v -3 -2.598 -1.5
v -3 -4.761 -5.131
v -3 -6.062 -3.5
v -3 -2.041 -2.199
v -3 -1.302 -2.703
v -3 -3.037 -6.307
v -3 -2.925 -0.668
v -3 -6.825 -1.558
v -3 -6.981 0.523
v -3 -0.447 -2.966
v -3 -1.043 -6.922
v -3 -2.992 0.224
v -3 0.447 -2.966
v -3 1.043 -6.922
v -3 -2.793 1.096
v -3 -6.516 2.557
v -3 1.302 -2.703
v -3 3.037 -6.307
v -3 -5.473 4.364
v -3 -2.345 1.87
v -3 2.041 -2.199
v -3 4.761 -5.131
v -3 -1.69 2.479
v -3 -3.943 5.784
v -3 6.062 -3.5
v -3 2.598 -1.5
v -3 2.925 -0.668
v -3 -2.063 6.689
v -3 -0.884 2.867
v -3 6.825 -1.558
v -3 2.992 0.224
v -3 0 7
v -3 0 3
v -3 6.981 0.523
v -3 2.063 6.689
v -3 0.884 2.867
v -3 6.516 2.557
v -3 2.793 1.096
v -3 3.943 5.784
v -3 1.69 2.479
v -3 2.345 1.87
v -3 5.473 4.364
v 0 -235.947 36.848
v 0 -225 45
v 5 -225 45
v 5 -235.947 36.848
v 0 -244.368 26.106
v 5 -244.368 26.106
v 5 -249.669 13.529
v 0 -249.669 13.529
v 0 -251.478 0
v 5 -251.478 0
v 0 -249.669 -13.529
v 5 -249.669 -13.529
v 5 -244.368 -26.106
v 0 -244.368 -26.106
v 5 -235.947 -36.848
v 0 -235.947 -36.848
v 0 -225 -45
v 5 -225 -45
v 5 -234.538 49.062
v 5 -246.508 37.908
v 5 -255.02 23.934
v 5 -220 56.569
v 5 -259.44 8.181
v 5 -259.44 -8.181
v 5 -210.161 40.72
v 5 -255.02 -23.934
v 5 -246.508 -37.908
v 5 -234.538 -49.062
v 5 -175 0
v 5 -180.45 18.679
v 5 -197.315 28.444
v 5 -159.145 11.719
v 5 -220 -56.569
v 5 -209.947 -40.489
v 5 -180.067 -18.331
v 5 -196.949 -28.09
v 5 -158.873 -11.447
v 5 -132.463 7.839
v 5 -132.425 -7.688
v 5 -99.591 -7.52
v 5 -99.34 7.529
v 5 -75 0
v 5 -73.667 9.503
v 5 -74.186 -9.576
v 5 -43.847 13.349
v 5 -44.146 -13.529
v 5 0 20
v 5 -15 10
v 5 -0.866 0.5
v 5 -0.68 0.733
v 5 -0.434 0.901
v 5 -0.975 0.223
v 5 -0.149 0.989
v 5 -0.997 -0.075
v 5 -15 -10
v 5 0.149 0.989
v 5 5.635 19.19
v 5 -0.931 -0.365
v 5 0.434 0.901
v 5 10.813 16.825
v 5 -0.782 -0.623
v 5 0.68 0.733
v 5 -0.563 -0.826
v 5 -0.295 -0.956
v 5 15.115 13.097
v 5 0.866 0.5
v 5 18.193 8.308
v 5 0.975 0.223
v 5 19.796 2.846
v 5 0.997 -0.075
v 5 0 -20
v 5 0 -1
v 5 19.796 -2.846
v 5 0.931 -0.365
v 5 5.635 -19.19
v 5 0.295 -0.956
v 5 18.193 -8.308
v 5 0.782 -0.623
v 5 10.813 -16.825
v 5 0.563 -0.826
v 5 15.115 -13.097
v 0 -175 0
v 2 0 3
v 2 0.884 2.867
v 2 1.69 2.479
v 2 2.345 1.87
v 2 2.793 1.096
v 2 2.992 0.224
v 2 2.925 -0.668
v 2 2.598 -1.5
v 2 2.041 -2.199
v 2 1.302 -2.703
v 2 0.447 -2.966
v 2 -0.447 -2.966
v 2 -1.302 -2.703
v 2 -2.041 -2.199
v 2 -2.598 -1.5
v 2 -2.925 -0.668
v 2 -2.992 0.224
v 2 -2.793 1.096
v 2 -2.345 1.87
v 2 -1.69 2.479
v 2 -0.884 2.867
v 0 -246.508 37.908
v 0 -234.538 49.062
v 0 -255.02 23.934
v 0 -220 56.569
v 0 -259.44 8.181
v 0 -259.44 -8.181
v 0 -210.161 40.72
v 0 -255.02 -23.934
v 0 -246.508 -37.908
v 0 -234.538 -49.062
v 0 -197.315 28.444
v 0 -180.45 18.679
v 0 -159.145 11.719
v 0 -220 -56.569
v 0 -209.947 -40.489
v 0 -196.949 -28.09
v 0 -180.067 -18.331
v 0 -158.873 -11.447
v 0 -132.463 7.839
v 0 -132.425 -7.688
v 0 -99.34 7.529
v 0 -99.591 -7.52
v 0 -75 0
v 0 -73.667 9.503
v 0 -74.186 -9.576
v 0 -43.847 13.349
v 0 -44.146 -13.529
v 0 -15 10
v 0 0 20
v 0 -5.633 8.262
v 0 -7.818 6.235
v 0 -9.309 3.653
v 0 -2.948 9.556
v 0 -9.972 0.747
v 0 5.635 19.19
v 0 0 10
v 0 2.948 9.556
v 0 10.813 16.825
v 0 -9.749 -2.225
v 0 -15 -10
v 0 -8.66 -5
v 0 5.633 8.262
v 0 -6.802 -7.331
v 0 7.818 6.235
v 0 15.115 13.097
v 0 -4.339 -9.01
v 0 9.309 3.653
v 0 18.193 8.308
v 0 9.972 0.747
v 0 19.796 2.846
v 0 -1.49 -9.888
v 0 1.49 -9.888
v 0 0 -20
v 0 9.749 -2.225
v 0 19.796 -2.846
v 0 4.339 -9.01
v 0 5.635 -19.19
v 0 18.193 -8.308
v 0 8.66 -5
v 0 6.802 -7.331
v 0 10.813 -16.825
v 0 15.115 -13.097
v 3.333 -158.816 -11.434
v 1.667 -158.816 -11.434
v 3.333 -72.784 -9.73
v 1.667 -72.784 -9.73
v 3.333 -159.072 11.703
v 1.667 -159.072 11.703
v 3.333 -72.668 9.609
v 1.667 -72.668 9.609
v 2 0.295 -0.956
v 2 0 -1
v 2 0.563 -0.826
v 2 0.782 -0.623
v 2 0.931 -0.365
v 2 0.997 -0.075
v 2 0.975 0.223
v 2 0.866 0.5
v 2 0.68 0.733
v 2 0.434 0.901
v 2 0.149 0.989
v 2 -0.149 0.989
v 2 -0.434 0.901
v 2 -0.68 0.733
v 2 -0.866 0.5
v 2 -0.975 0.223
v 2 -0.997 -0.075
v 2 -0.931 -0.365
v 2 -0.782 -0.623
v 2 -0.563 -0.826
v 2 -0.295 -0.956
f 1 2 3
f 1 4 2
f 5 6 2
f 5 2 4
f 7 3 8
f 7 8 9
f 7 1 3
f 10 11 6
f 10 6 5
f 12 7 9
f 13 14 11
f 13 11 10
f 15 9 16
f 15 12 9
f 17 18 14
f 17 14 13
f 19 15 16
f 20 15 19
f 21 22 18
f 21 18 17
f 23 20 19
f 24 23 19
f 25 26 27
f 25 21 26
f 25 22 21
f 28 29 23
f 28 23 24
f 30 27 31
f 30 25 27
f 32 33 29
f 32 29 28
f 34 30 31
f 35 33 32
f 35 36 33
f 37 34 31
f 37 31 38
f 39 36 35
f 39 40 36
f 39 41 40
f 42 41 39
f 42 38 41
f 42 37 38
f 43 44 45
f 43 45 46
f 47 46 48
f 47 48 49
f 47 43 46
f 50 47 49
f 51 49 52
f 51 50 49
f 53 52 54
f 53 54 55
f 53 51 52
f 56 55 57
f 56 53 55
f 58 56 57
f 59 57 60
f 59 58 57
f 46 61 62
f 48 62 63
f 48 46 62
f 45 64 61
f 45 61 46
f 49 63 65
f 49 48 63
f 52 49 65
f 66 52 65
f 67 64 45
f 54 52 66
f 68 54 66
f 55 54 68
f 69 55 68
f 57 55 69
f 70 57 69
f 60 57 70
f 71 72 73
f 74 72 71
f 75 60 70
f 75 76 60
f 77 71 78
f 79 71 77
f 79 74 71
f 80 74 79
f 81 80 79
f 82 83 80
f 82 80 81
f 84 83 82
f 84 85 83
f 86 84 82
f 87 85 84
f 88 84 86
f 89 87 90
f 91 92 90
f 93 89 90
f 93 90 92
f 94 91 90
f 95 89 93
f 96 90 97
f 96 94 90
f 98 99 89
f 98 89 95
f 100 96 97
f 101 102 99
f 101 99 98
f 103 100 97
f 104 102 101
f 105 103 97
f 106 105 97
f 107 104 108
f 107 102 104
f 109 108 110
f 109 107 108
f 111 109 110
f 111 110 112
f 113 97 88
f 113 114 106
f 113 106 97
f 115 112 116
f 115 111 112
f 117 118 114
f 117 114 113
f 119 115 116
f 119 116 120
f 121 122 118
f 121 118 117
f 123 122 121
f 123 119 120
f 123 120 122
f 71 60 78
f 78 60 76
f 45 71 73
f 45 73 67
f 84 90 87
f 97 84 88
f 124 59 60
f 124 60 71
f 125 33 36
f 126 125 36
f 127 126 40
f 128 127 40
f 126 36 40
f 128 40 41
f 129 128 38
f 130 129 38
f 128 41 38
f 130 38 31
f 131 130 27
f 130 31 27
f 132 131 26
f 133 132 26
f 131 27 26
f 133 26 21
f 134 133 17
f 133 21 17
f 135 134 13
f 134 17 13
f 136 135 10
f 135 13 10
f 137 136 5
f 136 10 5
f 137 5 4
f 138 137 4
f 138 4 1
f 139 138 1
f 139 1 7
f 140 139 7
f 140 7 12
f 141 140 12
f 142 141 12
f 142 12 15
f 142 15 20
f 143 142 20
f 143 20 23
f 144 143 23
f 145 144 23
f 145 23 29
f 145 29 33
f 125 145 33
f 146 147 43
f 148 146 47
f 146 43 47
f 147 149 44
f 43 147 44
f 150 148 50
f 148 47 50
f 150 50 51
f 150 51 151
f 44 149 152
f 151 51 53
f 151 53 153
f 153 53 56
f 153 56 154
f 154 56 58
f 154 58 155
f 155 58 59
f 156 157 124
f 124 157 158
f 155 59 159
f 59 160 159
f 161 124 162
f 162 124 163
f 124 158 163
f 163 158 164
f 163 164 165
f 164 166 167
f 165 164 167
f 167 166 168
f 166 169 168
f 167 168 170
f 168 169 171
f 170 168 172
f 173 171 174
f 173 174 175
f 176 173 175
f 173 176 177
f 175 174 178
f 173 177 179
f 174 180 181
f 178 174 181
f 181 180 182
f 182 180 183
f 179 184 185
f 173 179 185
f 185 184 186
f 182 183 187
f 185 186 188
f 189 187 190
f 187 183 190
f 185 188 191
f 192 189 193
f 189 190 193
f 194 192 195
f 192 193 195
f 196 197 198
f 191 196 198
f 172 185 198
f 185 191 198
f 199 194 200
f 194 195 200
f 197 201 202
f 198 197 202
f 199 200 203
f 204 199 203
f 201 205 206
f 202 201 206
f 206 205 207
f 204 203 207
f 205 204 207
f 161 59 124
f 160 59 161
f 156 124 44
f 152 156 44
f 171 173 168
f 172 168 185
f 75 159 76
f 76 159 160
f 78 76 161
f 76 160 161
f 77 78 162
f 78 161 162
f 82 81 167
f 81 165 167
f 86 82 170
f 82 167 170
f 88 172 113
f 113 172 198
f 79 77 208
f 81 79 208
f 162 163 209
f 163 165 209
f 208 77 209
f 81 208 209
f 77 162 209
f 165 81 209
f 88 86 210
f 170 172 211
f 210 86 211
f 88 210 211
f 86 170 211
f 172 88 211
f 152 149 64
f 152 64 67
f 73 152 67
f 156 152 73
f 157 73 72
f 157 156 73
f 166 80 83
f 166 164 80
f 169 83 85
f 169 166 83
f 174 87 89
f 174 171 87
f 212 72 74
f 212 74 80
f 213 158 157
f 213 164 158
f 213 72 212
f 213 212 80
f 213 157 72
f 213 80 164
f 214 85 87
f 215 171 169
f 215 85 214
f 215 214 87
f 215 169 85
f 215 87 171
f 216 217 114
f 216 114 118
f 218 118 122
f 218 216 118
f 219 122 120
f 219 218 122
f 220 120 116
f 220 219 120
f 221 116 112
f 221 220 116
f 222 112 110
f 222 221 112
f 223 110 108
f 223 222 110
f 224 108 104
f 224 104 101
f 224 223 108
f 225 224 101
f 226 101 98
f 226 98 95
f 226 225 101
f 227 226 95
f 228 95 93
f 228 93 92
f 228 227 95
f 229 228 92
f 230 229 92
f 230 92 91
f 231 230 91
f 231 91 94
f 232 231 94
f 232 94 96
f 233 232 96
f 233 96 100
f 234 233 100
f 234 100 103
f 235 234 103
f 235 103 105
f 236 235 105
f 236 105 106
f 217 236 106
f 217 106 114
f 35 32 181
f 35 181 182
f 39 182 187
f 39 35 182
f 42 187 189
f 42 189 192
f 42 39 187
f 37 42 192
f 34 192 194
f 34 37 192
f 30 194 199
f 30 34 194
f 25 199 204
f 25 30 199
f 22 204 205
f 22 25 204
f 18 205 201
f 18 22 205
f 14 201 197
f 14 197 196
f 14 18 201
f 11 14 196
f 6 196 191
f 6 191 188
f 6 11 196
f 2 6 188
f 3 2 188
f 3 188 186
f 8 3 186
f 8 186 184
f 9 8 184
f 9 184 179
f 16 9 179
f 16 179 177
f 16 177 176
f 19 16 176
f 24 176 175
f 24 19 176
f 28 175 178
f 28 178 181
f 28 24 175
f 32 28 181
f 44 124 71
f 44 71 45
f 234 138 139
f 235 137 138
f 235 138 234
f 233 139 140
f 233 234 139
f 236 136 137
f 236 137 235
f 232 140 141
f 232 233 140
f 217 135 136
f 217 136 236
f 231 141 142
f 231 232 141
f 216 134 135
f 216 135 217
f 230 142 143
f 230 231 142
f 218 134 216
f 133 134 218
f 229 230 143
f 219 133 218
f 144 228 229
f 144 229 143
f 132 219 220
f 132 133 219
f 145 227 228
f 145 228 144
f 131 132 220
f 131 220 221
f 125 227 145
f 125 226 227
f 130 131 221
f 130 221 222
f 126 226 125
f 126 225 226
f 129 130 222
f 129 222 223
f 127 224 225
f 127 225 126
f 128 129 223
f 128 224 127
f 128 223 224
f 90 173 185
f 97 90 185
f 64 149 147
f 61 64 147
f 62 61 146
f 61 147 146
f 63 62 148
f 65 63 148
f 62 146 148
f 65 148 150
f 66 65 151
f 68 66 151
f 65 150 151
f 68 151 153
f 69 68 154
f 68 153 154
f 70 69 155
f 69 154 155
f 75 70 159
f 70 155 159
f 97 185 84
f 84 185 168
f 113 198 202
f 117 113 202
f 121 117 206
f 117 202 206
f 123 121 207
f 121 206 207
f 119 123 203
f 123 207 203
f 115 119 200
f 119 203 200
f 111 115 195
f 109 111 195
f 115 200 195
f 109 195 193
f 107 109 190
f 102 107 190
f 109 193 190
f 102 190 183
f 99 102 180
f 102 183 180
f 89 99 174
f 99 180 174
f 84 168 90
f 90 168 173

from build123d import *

# Parameters (mm, degrees)
ESQUISSE1_R             = 1
BOSS_EXTRU_1_DEPTH      = 5
ESQUISSE2_R             = 3
ENL_V_MAT_EXTRU_1_DEPTH = 2
BOSS_EXTRU_2_START      = 3
ESQUISSE3_R             = 10
ESQUISSE3_R_2           = 3
BOSS_EXTRU_2_DEPTH      = 3
CHANFREIN1_SIZE         = 3


with BuildPart() as part:
    # Esquisse1 → Boss.-Extru.1 (new body)
    with BuildSketch(Plane(origin=(0, 0, 0), x_dir=(0, 0, -1), z_dir=(1, 0, 0))):
        with BuildLine():
            ThreePointArc((20, 0), (0, 20), (-20, 0))
            add(Edge.make_bspline(
                [(-56.568542495, -220), (19.779297851, -184.881212826), (-13.461804543, -52.728965786), (-20, 0)],
                knots=[0, 0, 0, 0, 1, 1, 1, 1], degree=3))
            ThreePointArc((-56.568542495, -220), (0, -260), (56.568542495, -220))
            add(Edge.make_bspline(
                [(56.568542495, -220), (-20.766043456, -183.938290331), (14.228843578, -53.461939266), (20, 0)],
                knots=[0, 0, 0, 0, 1, 1, 1, 1], degree=3))
        make_face()
        Circle(ESQUISSE1_R, mode=Mode.SUBTRACT)
        with BuildLine():
            Line((45, -225), (0, -175))
            Line((0, -175), (-45, -225))
            ThreePointArc((-45, -225), (0, -251.478150705), (45, -225))
        make_face(mode=Mode.SUBTRACT)
        Polygon((-10, -15), (10, -15), (0, -75), align=None, mode=Mode.SUBTRACT)
    extrude(amount=BOSS_EXTRU_1_DEPTH)

    # Esquisse2 → Enlèv. mat.-Extru.1 (cut)
    with BuildSketch(Plane.ZY):
        Circle(ESQUISSE2_R)
    extrude(amount=-ENL_V_MAT_EXTRU_1_DEPTH, mode=Mode.SUBTRACT)

    # Esquisse3 → Boss.-Extru.2 (add)
    with BuildSketch(Plane.ZY.offset(BOSS_EXTRU_2_START)):
        Circle(ESQUISSE3_R)
        Circle(ESQUISSE3_R_2, mode=Mode.SUBTRACT)
    extrude(amount=-BOSS_EXTRU_2_DEPTH)

    # Chanfrein1
    chanfrein1_edges = [part.edges().sort_by_distance(p)[0] for p in [
        (-3, 0, -10),
    ]]
    chamfer(chanfrein1_edges, length=CHANFREIN1_SIZE - 0.0001)  # a hair under: the kernel refuses the full size


solid = part.part
